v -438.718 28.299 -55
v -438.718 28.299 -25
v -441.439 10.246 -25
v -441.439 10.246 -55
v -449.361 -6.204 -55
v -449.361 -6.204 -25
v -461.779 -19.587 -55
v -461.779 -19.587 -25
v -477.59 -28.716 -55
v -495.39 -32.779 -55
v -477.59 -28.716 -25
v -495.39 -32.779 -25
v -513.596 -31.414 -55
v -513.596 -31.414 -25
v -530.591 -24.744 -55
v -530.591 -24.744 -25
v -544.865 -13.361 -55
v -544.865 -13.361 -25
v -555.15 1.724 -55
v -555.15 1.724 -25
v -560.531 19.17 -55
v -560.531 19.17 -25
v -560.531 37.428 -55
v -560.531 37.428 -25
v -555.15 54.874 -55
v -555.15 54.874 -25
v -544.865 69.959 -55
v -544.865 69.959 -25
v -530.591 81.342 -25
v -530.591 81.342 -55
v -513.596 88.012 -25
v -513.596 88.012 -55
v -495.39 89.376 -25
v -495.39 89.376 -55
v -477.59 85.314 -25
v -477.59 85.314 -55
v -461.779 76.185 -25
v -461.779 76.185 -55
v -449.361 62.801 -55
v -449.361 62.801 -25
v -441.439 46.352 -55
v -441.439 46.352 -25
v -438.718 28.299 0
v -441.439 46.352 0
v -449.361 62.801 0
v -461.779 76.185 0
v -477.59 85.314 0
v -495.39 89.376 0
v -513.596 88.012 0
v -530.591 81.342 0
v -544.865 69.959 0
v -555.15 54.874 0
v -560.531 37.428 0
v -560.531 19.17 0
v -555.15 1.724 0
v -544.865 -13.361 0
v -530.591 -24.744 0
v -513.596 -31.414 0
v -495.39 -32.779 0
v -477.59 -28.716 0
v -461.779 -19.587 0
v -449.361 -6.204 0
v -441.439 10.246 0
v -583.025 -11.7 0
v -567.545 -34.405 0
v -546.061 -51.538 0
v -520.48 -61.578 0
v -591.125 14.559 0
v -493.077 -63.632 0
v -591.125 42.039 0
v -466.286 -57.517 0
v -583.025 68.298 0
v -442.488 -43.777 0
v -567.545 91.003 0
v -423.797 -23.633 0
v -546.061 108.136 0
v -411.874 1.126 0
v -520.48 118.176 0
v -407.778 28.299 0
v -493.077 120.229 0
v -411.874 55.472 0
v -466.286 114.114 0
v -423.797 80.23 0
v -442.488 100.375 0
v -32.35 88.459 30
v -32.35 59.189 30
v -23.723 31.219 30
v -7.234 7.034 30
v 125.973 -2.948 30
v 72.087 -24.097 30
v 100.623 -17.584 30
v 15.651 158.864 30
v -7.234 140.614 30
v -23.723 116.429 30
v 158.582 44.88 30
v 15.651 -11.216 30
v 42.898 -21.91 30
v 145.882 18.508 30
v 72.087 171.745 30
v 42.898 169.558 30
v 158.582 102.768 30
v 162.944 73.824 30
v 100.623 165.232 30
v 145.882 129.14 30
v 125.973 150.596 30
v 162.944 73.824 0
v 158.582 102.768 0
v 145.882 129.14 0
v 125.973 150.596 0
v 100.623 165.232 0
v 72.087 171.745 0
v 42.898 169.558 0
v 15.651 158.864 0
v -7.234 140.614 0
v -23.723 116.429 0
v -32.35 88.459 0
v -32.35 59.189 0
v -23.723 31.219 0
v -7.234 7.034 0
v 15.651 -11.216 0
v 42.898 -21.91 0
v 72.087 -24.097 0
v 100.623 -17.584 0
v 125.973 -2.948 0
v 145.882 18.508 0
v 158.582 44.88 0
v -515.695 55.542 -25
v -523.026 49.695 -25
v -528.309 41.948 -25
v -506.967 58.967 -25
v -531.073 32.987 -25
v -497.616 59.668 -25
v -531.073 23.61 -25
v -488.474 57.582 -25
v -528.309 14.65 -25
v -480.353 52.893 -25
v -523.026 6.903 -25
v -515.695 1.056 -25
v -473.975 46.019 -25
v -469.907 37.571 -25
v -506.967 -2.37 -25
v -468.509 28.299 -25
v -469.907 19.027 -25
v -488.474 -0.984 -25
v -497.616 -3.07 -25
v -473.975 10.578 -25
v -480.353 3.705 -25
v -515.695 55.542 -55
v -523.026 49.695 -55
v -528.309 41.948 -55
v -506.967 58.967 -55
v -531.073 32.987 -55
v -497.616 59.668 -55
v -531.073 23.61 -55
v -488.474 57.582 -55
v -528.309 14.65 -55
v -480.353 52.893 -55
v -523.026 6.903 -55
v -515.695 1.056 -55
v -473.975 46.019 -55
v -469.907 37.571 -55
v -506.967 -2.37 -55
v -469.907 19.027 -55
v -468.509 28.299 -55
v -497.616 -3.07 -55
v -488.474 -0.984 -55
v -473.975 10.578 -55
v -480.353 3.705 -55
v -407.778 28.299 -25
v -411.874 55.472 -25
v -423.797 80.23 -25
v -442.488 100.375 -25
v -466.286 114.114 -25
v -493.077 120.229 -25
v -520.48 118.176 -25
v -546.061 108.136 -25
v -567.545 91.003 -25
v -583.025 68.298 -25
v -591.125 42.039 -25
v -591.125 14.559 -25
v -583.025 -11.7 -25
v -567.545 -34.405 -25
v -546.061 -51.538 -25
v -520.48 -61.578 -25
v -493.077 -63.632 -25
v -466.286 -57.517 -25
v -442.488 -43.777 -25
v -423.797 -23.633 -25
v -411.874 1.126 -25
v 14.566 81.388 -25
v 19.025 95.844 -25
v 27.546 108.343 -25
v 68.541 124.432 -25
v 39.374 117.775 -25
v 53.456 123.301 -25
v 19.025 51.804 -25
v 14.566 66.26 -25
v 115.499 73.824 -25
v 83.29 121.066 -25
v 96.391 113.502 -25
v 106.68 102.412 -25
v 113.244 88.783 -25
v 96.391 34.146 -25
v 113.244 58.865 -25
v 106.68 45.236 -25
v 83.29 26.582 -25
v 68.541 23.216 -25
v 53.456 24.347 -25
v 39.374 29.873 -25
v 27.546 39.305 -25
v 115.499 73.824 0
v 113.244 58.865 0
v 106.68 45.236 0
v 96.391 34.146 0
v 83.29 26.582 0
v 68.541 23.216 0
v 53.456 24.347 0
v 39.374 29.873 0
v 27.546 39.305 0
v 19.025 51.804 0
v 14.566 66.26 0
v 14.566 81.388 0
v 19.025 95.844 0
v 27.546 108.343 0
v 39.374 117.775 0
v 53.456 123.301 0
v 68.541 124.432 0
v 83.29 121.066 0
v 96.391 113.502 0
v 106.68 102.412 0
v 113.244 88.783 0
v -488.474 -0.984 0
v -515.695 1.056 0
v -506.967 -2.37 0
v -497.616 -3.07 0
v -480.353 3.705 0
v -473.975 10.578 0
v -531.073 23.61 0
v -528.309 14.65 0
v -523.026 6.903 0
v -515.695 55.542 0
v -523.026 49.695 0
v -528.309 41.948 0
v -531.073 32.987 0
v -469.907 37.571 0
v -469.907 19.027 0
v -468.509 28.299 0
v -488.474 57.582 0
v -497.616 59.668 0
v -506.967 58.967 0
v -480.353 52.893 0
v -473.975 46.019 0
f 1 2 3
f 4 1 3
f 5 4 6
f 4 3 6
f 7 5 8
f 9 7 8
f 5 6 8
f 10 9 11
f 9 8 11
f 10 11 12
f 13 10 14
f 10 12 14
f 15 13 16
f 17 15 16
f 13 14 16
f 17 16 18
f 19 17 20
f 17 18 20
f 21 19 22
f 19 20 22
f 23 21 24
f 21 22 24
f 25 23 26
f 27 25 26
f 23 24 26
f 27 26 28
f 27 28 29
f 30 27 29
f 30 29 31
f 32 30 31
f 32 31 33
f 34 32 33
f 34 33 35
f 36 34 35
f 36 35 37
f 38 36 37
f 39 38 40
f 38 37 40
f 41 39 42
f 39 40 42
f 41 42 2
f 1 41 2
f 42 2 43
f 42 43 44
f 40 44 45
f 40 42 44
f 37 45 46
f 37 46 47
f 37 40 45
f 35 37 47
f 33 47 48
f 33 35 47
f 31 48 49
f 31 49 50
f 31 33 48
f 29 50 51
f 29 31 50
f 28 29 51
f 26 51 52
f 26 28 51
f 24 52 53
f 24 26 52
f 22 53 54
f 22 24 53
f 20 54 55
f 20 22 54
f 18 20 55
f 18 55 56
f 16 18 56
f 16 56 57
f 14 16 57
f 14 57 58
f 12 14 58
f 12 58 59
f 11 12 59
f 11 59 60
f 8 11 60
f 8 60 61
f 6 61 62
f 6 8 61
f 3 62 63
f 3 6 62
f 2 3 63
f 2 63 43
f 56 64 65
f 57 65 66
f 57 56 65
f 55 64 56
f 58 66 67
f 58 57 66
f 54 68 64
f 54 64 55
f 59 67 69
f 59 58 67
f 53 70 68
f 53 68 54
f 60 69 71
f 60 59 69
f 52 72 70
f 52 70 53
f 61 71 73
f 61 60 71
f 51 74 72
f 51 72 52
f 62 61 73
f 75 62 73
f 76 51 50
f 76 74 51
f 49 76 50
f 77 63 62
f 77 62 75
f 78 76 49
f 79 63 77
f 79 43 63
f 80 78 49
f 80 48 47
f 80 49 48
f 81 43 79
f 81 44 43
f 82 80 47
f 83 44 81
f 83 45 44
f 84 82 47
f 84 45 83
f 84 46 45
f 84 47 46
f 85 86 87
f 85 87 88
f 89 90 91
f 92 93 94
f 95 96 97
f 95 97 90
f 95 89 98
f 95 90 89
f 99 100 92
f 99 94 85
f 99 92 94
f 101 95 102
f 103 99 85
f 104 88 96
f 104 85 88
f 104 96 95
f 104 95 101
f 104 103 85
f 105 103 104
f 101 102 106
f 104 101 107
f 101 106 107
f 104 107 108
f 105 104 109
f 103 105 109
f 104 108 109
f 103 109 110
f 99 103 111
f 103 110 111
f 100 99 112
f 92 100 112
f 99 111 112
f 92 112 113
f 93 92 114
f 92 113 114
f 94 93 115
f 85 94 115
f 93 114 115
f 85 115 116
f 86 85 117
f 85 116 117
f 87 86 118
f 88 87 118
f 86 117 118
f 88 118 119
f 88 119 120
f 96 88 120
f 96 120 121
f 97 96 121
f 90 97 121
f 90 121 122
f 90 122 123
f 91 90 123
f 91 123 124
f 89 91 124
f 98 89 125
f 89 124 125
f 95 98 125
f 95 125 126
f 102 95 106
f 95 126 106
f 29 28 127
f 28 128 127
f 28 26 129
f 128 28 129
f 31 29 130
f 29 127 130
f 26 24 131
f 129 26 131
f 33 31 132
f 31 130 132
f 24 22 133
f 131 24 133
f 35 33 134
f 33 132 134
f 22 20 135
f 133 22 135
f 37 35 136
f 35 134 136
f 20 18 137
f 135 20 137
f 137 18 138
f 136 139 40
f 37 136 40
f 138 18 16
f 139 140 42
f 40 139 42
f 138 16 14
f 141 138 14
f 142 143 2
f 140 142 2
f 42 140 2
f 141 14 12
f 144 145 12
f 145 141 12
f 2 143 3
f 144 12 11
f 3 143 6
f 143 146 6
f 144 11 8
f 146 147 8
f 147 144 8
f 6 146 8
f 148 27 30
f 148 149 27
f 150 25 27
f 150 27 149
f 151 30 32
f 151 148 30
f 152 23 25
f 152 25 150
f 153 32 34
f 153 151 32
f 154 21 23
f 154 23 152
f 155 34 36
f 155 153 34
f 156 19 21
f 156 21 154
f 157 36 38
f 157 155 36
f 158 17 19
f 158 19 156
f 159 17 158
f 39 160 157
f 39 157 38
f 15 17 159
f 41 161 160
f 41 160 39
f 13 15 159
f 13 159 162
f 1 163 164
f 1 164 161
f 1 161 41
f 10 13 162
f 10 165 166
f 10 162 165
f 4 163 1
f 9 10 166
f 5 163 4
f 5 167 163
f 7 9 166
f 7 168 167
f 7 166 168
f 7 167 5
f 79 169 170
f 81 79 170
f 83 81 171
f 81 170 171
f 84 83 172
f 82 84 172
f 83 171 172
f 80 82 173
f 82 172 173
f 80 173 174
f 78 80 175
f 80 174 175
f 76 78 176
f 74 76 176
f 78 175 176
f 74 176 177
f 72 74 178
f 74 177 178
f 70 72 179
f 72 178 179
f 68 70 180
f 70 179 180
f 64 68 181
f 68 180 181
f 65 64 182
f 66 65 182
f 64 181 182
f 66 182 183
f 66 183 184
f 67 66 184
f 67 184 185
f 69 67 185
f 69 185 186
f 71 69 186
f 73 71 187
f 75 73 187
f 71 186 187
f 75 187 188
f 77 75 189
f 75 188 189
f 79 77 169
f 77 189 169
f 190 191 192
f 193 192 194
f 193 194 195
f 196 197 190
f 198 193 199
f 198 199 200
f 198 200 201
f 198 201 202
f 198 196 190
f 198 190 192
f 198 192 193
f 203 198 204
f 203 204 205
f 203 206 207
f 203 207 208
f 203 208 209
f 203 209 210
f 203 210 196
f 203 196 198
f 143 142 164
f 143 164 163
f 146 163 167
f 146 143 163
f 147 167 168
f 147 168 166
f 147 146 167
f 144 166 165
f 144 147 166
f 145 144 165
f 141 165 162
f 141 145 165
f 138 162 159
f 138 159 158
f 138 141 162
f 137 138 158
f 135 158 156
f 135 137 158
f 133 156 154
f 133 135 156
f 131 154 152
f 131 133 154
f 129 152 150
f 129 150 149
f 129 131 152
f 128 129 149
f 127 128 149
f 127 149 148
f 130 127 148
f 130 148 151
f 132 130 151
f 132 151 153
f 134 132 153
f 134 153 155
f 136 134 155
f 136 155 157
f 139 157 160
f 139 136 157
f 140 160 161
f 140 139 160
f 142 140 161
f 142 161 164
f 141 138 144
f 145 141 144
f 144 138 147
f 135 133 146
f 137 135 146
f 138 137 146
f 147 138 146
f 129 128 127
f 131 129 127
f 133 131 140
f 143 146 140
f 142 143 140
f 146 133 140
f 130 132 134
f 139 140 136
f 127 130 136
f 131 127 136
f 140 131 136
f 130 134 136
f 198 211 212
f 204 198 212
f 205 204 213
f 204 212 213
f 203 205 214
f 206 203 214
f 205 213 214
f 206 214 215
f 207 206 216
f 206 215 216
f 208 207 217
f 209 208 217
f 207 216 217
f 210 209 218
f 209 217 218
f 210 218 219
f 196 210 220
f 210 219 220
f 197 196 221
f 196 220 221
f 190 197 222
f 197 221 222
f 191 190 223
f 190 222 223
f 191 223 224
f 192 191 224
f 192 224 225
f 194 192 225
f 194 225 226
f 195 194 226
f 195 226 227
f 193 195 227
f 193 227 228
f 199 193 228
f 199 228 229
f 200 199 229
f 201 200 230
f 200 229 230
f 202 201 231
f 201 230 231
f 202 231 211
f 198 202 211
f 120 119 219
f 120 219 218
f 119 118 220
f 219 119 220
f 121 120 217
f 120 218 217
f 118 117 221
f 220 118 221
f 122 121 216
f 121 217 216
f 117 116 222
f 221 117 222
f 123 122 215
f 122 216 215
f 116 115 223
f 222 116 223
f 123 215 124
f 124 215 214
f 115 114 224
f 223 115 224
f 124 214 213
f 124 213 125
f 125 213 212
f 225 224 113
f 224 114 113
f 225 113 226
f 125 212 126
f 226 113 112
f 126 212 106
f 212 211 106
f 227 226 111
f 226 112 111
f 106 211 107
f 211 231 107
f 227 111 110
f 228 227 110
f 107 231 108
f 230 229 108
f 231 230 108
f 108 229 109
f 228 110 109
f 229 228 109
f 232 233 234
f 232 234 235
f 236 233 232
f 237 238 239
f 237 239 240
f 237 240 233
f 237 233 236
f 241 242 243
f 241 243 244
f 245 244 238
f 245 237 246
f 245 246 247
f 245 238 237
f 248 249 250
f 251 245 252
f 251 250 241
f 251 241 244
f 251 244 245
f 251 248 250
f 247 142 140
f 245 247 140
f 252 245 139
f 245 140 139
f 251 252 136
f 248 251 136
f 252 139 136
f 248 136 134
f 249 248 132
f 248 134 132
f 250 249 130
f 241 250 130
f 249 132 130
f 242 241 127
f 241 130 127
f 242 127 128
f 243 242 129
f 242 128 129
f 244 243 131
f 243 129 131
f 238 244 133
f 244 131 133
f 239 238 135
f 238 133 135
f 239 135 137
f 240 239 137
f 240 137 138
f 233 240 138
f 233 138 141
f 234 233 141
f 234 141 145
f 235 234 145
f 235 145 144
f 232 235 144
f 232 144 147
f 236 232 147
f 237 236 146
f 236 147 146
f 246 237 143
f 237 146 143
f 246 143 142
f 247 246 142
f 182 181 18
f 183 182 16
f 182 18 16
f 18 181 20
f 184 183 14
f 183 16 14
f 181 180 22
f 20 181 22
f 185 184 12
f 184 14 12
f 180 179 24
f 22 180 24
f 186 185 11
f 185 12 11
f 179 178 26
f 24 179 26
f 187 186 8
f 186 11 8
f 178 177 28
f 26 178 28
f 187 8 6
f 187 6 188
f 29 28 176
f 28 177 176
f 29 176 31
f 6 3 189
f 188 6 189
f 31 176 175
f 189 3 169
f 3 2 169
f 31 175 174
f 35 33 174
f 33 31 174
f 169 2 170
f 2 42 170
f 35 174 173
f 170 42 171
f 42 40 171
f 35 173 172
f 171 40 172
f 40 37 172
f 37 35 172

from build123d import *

# Parameters (mm, degrees)
F0_R     = 98.1955473367
F0_R_2   = 40.2352449295
F1_DEPTH = 30
F2_R     = 50.749891167
F3_DEPTH = 25
F4_R     = 61.2486550409
F4_R_2   = 31.4572402961
F5_DEPTH = 30
F6_R     = 92.1882185635
F6_R_2   = 61.2486550409
F7_DEPTH = 25
F6_R_3   = 31.4572402961


with BuildPart() as f1:
    # F0 (on Top) → F1 (new body)
    with BuildSketch(Plane.XY):
        with Locations((64.7486150265, 73.8239958882)):
            Circle(F0_R)
        with Locations((49.9009788036, 57.3229975998)):
            Circle(F0_R_2, mode=Mode.SUBTRACT)
        with Locations((49.9009788036, 57.3229975998)):
            Circle(F0_R_2)
    extrude(amount=F1_DEPTH)

    # F2 (on face) → F3 (join)
    with BuildSketch(Plane(origin=(0, 0, 0), x_dir=(1, 0, 0), z_dir=(0, 0, -1))):
        with Locations((64.7486150265, -73.8239958882)):
            Circle(F2_R)
    extrude(amount=F3_DEPTH)


with BuildPart() as f5:
    # F4 (on face) → F5 (new body)
    with BuildSketch(Plane(origin=(0, 0, -25), x_dir=(1, 0, 0), z_dir=(0, 0, -1))):
        with Locations((-499.9666213989, -28.2988809049)):
            Circle(F4_R)
        with Locations((-499.9666213989, -28.2988809049)):
            Circle(F4_R_2, mode=Mode.SUBTRACT)
    extrude(amount=F5_DEPTH)


with BuildPart() as f7:
    # F6 (on face) → F7 (new body)
    with BuildSketch(Plane.XY.offset(-25)):
        with Locations((-499.9666213989, 28.2988809049)):
            Circle(F6_R)
        with Locations((-499.9666213989, 28.2988809049)):
            Circle(F6_R_2, mode=Mode.SUBTRACT)
    extrude(amount=F7_DEPTH)


with BuildPart() as f7b:
    # F6 (on face) → F7, piece 2 (new body)
    with BuildSketch(Plane.XY.offset(-25)):
        with Locations((-499.9666213989, 28.2988809049)):
            Circle(F6_R_3)
    extrude(amount=F7_DEPTH)


solid = Compound([f1.part, f5.part, f7.part, f7b.part])
